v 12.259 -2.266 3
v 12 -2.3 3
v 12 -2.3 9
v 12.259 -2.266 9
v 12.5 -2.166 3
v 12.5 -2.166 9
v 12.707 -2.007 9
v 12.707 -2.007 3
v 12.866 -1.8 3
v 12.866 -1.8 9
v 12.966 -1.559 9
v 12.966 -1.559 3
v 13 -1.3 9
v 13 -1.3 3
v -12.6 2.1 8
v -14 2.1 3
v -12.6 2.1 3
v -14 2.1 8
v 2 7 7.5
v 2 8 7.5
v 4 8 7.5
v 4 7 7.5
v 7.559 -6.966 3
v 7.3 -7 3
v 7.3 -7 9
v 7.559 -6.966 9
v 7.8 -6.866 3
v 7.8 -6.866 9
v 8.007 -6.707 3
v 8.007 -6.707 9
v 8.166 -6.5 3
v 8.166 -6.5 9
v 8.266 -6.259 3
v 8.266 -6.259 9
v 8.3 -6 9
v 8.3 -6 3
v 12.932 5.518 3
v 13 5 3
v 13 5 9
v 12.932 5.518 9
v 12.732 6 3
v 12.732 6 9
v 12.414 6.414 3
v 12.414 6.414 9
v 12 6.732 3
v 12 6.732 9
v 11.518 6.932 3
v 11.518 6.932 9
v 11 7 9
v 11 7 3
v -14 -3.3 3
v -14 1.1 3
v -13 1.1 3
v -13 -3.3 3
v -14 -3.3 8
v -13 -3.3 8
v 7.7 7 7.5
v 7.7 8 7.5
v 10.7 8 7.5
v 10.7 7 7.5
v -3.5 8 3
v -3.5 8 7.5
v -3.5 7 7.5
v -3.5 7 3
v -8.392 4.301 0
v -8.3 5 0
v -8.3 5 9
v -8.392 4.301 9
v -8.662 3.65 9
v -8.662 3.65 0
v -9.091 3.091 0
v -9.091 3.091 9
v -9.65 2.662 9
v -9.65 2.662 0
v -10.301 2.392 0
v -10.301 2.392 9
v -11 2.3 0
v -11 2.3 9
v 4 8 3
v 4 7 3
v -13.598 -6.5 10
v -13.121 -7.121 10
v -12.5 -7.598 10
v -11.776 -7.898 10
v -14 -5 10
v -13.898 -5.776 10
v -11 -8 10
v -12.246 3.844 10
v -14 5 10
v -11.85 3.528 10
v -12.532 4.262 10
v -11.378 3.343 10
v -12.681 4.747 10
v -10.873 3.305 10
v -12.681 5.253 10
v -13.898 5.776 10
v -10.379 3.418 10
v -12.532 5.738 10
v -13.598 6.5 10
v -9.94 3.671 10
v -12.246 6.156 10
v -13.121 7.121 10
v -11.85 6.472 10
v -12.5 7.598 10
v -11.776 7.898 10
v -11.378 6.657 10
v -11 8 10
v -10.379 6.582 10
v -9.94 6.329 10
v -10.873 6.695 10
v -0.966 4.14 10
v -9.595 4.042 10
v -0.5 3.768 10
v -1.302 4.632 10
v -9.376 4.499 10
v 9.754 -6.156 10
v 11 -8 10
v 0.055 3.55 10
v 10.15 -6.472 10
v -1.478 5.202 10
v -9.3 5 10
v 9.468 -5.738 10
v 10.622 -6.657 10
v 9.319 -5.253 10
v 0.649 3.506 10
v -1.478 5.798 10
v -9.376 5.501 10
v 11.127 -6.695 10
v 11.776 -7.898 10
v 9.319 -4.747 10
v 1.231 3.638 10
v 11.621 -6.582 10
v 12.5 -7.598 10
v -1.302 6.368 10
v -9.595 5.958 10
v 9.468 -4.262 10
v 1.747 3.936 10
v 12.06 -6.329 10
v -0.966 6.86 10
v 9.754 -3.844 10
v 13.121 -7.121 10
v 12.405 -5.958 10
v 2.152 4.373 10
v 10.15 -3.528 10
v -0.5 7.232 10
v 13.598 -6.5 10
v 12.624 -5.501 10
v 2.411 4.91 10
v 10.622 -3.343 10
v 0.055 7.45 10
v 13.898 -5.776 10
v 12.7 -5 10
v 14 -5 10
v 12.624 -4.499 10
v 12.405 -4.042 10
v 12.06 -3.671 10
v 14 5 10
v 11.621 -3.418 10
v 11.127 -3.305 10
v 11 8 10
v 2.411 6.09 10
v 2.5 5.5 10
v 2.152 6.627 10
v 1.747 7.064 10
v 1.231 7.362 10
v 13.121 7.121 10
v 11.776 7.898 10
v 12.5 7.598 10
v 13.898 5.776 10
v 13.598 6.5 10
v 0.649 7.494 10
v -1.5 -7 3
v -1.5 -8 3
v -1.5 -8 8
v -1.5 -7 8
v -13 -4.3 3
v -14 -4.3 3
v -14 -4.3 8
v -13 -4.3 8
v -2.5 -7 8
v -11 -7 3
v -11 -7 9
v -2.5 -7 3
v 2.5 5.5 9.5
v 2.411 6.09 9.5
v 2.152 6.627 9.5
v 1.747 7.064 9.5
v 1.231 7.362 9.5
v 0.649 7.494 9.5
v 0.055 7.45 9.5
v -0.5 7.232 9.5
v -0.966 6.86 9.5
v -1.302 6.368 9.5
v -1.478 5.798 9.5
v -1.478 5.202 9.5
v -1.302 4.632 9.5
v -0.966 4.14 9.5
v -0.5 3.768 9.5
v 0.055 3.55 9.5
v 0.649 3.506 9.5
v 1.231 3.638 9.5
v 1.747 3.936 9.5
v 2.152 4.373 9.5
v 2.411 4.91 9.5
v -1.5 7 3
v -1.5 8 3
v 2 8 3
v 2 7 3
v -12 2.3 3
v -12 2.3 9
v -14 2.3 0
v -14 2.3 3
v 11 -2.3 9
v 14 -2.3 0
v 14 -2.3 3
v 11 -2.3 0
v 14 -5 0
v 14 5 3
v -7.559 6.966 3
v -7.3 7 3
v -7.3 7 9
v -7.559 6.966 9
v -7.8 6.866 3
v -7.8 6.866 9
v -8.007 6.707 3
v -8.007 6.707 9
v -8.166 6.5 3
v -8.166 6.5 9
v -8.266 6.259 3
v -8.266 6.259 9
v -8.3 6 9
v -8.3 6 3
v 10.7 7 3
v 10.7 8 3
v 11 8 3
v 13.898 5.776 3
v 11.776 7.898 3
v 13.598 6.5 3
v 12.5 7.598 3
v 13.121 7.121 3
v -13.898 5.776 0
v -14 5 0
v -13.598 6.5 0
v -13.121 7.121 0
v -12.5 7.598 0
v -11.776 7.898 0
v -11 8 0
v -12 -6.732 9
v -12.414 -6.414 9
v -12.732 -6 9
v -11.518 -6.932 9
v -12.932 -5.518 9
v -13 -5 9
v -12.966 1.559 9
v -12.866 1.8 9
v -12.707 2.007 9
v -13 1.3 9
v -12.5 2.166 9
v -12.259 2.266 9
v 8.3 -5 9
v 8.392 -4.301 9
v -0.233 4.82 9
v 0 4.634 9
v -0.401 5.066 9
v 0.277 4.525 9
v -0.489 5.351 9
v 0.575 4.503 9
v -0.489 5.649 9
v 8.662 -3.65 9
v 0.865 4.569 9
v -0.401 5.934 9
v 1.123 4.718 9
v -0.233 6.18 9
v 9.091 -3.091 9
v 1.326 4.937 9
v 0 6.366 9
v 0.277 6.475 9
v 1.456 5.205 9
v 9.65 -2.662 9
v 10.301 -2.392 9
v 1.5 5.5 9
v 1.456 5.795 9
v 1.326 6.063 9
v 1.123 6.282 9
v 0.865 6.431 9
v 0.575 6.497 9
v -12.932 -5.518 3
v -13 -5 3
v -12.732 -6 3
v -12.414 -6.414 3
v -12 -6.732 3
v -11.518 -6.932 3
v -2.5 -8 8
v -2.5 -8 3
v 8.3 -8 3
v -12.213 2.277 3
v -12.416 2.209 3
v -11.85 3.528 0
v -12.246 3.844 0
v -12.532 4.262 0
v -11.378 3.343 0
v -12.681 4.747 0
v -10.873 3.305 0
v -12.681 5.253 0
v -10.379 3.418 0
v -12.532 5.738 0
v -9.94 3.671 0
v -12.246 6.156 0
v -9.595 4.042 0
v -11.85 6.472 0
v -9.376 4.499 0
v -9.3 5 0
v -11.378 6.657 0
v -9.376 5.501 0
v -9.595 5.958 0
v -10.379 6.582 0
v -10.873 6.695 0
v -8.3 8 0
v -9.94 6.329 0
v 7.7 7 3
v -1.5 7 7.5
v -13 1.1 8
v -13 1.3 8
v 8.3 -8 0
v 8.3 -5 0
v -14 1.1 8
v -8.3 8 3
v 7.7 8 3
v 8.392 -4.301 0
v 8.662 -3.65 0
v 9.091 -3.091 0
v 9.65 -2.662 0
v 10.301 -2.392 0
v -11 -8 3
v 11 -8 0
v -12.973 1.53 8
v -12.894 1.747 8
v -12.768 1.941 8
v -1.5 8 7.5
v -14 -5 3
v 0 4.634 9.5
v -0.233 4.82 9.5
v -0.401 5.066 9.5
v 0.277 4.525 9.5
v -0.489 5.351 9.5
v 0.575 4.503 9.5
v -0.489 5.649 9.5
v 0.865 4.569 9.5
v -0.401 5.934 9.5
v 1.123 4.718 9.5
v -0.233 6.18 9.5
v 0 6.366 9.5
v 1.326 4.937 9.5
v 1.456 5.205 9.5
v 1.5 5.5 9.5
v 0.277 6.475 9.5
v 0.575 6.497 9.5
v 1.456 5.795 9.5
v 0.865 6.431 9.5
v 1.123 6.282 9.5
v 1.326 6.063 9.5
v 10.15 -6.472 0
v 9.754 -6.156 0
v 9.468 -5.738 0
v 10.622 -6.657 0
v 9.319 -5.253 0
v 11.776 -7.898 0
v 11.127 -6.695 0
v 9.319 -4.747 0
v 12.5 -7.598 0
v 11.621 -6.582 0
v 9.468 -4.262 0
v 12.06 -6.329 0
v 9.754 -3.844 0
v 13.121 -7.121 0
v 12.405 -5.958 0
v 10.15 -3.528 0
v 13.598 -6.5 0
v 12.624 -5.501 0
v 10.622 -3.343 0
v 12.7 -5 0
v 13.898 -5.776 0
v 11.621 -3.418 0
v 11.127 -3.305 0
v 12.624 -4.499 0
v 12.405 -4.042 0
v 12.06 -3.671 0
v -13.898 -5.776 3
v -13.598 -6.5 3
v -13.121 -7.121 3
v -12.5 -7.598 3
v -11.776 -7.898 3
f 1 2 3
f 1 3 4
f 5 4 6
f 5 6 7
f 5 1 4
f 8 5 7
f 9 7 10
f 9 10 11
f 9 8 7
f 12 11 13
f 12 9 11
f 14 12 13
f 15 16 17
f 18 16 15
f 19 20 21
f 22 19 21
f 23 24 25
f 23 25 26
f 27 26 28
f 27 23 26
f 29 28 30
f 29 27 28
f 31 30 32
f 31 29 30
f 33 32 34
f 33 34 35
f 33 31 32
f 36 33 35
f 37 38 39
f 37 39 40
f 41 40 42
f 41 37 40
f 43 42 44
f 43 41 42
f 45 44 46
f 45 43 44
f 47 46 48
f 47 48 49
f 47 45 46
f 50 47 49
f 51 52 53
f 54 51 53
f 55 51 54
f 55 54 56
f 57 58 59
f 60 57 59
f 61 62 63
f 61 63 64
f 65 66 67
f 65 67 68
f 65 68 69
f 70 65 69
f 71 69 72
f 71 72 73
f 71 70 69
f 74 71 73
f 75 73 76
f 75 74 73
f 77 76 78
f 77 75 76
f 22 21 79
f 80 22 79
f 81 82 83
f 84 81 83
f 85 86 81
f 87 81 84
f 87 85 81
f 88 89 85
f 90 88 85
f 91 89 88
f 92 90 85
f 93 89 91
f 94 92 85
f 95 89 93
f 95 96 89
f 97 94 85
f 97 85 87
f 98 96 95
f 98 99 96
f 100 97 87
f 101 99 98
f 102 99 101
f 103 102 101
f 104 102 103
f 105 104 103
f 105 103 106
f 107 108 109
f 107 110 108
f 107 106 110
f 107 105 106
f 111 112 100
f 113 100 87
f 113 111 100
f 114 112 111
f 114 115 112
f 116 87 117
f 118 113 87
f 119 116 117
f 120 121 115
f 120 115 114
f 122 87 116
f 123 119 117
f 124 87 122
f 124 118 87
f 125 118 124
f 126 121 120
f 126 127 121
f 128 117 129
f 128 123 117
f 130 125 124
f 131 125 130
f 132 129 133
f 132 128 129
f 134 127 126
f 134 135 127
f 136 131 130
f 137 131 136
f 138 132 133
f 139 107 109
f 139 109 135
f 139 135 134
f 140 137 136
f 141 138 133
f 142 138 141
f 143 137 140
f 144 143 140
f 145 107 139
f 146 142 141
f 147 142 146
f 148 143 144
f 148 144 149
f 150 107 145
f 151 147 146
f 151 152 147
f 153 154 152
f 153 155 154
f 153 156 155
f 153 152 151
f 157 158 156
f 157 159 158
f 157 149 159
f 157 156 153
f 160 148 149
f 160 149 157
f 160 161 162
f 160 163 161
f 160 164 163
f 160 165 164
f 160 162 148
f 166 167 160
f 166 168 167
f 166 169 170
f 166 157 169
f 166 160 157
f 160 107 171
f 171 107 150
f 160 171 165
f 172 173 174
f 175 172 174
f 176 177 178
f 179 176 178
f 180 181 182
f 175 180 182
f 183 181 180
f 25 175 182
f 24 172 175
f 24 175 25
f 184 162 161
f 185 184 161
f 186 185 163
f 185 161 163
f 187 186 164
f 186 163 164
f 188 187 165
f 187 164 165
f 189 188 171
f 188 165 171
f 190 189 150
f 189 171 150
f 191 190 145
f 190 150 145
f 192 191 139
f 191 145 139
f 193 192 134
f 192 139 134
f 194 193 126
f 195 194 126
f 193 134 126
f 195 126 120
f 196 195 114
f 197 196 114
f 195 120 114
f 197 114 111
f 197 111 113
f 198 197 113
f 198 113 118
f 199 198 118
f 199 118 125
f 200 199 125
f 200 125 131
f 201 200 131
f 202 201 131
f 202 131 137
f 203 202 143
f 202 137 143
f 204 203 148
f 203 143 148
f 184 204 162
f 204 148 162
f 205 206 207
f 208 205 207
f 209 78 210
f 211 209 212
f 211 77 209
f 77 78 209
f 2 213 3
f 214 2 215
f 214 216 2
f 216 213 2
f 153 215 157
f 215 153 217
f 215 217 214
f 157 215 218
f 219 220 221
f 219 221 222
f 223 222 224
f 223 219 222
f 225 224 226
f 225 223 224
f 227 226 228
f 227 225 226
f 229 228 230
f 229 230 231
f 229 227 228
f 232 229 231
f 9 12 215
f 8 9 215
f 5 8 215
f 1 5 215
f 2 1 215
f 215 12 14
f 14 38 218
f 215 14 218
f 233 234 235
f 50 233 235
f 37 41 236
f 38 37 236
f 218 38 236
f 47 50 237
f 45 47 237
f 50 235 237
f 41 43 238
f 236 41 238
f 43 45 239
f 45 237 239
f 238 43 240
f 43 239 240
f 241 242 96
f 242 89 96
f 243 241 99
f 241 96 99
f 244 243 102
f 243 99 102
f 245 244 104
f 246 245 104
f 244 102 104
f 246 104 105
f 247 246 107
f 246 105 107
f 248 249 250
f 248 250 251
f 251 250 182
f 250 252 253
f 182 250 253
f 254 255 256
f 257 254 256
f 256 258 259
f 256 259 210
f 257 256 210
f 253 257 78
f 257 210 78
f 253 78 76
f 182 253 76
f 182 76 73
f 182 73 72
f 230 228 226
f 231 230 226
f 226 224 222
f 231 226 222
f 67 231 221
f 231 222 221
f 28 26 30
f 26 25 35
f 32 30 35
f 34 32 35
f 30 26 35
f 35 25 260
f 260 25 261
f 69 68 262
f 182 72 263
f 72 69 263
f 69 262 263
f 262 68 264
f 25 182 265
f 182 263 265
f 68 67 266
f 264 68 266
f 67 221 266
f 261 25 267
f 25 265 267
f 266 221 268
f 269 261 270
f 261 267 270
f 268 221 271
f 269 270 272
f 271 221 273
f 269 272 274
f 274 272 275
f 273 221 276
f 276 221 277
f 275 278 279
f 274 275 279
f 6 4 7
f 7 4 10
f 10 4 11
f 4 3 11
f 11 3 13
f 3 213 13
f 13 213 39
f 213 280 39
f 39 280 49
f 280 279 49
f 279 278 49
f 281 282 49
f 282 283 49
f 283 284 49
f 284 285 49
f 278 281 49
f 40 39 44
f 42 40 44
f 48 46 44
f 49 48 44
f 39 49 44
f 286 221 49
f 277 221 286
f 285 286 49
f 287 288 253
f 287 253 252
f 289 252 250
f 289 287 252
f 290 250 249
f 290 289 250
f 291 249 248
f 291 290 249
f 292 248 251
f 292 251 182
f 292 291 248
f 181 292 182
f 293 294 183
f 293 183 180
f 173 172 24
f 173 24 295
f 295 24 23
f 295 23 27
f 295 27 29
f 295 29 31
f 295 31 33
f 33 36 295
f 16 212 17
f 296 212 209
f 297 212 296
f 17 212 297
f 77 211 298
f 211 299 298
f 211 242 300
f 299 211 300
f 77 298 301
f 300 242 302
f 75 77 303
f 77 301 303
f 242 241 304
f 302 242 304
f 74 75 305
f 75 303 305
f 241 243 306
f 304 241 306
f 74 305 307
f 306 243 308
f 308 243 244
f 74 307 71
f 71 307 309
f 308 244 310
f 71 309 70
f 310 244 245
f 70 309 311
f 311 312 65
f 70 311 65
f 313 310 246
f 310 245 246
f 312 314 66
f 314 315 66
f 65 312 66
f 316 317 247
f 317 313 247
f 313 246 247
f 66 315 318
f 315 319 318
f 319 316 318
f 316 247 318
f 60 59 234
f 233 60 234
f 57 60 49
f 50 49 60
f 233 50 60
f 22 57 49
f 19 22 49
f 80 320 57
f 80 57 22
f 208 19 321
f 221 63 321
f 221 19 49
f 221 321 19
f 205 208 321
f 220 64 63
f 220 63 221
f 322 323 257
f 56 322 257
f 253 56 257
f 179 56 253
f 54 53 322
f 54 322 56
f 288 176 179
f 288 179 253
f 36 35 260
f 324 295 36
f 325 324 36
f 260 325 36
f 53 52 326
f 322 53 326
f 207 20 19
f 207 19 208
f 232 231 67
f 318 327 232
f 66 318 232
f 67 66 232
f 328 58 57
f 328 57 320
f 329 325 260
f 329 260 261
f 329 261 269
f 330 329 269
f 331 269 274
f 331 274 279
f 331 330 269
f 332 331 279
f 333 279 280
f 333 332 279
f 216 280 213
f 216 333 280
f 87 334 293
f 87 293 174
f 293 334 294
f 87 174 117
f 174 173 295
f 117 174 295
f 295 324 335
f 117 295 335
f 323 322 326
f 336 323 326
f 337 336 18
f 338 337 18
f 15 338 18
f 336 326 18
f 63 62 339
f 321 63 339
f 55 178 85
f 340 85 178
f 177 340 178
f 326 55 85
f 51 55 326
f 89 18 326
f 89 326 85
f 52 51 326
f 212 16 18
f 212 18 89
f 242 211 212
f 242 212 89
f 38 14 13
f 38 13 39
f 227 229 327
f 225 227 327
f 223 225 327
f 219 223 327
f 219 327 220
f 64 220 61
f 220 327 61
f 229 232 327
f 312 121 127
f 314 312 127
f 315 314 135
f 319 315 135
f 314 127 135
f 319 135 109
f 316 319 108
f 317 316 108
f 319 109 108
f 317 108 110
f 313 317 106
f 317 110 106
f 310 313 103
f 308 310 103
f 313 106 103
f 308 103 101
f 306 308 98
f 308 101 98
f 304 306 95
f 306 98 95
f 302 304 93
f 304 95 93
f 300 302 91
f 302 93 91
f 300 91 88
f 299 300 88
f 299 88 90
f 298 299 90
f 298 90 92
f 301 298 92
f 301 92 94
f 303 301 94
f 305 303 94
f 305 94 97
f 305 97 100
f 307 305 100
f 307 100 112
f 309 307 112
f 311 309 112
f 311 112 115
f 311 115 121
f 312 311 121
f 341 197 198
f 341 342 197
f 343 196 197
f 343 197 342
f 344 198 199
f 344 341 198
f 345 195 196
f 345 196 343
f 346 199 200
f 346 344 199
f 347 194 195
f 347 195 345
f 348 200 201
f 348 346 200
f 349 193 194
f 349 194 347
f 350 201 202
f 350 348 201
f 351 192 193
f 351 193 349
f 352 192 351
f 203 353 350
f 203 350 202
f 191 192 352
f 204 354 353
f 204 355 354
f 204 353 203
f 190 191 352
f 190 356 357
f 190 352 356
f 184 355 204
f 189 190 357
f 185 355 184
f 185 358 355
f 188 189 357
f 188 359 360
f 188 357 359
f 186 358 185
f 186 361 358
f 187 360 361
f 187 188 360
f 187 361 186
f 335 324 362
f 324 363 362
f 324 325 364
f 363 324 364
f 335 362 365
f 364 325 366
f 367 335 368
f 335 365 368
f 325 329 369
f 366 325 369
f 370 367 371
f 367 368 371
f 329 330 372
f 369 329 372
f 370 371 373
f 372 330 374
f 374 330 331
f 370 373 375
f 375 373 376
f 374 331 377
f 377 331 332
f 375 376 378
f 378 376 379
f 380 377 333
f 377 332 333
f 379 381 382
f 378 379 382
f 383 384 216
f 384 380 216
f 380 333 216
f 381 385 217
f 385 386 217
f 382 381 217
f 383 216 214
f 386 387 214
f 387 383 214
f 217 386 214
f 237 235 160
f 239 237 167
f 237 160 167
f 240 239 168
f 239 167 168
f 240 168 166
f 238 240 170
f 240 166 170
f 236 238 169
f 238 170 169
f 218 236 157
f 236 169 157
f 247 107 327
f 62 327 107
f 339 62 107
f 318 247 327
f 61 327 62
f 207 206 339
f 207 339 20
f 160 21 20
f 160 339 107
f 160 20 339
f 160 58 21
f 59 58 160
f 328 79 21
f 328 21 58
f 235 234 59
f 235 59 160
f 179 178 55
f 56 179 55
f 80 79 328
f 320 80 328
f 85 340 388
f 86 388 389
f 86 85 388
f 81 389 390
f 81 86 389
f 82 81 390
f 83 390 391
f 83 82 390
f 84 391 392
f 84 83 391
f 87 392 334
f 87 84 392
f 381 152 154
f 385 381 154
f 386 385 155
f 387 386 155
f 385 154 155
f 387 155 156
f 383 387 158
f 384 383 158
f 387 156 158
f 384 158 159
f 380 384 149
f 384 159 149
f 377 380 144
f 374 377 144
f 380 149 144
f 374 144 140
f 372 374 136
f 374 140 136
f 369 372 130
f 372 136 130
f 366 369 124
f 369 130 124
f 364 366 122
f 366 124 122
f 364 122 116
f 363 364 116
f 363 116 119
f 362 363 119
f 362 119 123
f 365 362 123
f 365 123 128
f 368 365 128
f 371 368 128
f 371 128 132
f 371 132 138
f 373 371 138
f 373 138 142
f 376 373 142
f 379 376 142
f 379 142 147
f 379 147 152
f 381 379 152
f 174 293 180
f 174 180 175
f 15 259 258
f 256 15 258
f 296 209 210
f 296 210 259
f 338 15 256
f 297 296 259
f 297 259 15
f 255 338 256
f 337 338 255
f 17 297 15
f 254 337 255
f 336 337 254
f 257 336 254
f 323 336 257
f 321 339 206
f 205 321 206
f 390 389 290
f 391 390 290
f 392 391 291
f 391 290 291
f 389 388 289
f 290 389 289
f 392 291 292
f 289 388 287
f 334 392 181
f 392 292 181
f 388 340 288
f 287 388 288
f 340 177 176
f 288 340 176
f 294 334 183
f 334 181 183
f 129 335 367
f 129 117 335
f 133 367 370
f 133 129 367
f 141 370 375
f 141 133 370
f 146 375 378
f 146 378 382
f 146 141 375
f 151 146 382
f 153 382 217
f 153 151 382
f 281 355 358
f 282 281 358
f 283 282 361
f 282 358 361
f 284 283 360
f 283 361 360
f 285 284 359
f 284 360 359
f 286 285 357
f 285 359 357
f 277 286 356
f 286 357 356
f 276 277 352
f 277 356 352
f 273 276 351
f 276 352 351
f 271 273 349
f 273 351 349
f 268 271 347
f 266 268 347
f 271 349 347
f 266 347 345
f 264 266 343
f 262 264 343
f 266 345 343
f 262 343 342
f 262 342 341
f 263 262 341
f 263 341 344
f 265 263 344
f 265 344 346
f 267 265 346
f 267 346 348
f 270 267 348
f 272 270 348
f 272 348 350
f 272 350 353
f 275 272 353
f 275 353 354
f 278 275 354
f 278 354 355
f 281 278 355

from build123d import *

# Parameters (mm, degrees)
SZKIC1_W                        = 28
SZKIC1_H                        = 16
DODANIE_WYCI_GNI_CIE1_DEPTH     = 10
WYTNIJ_WYCI_GNI_CIE1_REACH      = 12
SZKIC2_R                        = 1.7
ZAOKR_GLENIE1_R                 = 3
WYTNIJ_WYCI_GNI_CIE2_DEPTH      = 4
WYTNIJ_WYCI_GNI_CIE2_DEPTH_BACK = 4
WYTNIJ_WYCI_GNI_CIE3_DEPTH      = 3
WYTNIJ_WYCI_GNI_CIE4_REACH      = 18
SZKIC5_W                        = 2
SZKIC5_H                        = 4.5
SZKIC5_W_2                      = 3
SZKIC6_R                        = 2
WYTNIJ_WYCI_GNI_CIE5_DEPTH      = 0.5
WYTNIJ_WYCI_GNI_CIE6_REACH      = 11.5
SZKIC7_R                        = 1
WYTNIJ_WYCI_GNI_CIE7_REACH      = 30
SZKIC8_W                        = 5
SZKIC8_H                        = 1
WYTNIJ_WYCI_GNI_CIE8_REACH      = 18
SZKIC9_W                        = 1
SZKIC9_H                        = 5


with BuildPart() as part:
    # Szkic1 → Dodanie-wyciągnięcie1 (new body)
    with BuildSketch(Plane.XY):
        Rectangle(SZKIC1_W, SZKIC1_H)
    extrude(amount=DODANIE_WYCI_GNI_CIE1_DEPTH)

    # Szkic2 → Wytnij-wyciągnięcie1 (cut, up to next)
    with BuildSketch(Plane.XY.offset(10), mode=Mode.PRIVATE) as wytnij_wyci_gni_cie1_sk1:
        with Locations((-11, 5)):
            Circle(SZKIC2_R)
    wytnij_wyci_gni_cie1_tool1 = extrude(wytnij_wyci_gni_cie1_sk1.sketch, amount=-WYTNIJ_WYCI_GNI_CIE1_REACH, mode=Mode.PRIVATE) & part.part
    add(wytnij_wyci_gni_cie1_tool1.solids().sort_by_distance((-11, 5, 10))[0], mode=Mode.SUBTRACT)
    # Szkic2 → Wytnij-wyciągnięcie1 (cut, up to next)
    with BuildSketch(Plane.XY.offset(10), mode=Mode.PRIVATE) as wytnij_wyci_gni_cie1_sk2:
        with Locations((11, -5)):
            Circle(SZKIC2_R)
    wytnij_wyci_gni_cie1_tool2 = extrude(wytnij_wyci_gni_cie1_sk2.sketch, amount=-WYTNIJ_WYCI_GNI_CIE1_REACH, mode=Mode.PRIVATE) & part.part
    add(wytnij_wyci_gni_cie1_tool2.solids().sort_by_distance((11, -5, 10))[0], mode=Mode.SUBTRACT)

    # Zaokrąglenie1
    zaokr_glenie1_edges = [part.edges().sort_by_distance(p)[0] for p in [
        (14, -8, 5),
        (-14, -8, 5),
        (-14, 8, 5),
        (14, 8, 5),
    ]]
    fillet(zaokr_glenie1_edges, radius=ZAOKR_GLENIE1_R)

    # Szkic3 → Wytnij-wyciągnięcie2 (cut, two sides)
    with BuildSketch(Plane.XY.offset(5)) as wytnij_wyci_gni_cie2_sk:
        with BuildLine():
            Line((11, 7), (-7.3, 7))
            ThreePointArc((-7.3, 7), (-8.007106781, 6.707106781), (-8.3, 6))
            Line((-8.3, 6), (-8.3, 5))
            ThreePointArc((-8.3, 5), (-9.090811691, 3.090811691), (-11, 2.3))
            Line((-11, 2.3), (-12, 2.3))
            ThreePointArc((-12, 2.3), (-12.707106781, 2.007106781), (-13, 1.3))
            Line((-13, 1.3), (-13, -5))
            ThreePointArc((-13, -5), (-12.414213562, -6.414213562), (-11, -7))
            Line((-11, -7), (7.3, -7))
            ThreePointArc((7.3, -7), (8.007106781, -6.707106781), (8.3, -6))
            Line((8.3, -6), (8.3, -5))
            ThreePointArc((8.3, -5), (9.090811691, -3.090811691), (11, -2.3))
            Line((11, -2.3), (12, -2.3))
            ThreePointArc((12, -2.3), (12.707106781, -2.007106781), (13, -1.3))
            Line((13, -1.3), (13, 5))
            ThreePointArc((13, 5), (12.414213562, 6.414213562), (11, 7))
        make_face()
    extrude(amount=WYTNIJ_WYCI_GNI_CIE2_DEPTH, mode=Mode.SUBTRACT)
    extrude(wytnij_wyci_gni_cie2_sk.sketch, amount=-WYTNIJ_WYCI_GNI_CIE2_DEPTH_BACK, mode=Mode.SUBTRACT)

    # Szkic4 → Wytnij-wyciągnięcie3 (cut)
    with BuildSketch(Plane(origin=(0, 0, 0), x_dir=(-1, 0, 0), z_dir=(0, 0, -1))):
        with BuildLine():
            Line((-11, 8), (8.3, 8))
            Line((8.3, 8), (8.3, 5))
            ThreePointArc((8.3, 5), (9.090811691, 3.090811691), (11, 2.3))
            Line((11, 2.3), (14, 2.3))
            Line((14, 2.3), (14, -5))
            ThreePointArc((14, -5), (13.121320344, -7.121320344), (11, -8))
            Line((11, -8), (-8.3, -8))
            Line((-8.3, -8), (-8.3, -5))
            ThreePointArc((-8.3, -5), (-9.090811691, -3.090811691), (-11, -2.3))
            Line((-11, -2.3), (-14, -2.3))
            Line((-14, -2.3), (-14, 5))
            ThreePointArc((-14, 5), (-13.121320344, 7.121320344), (-11, 8))
        make_face()
    extrude(amount=-WYTNIJ_WYCI_GNI_CIE3_DEPTH, mode=Mode.SUBTRACT)

    # Szkic5 → Wytnij-wyciągnięcie4 (cut, up to next)
    with BuildSketch(Plane(origin=(0, 8, 0), x_dir=(1, 0, 0), z_dir=(0, 1, 0)), mode=Mode.PRIVATE) as wytnij_wyci_gni_cie4_sk1:
        with Locations((3, -5.25)):
            Rectangle(SZKIC5_W, SZKIC5_H)
    wytnij_wyci_gni_cie4_tool1 = extrude(wytnij_wyci_gni_cie4_sk1.sketch, amount=-WYTNIJ_WYCI_GNI_CIE4_REACH, mode=Mode.PRIVATE) & part.part
    add(wytnij_wyci_gni_cie4_tool1.solids().sort_by_distance((3, 8, 5.25))[0], mode=Mode.SUBTRACT)
    # Szkic5 → Wytnij-wyciągnięcie4 (cut, up to next)
    with BuildSketch(Plane(origin=(0, 8, 0), x_dir=(1, 0, 0), z_dir=(0, 1, 0)), mode=Mode.PRIVATE) as wytnij_wyci_gni_cie4_sk2:
        with Locations((9.2, -5.25)):
            Rectangle(SZKIC5_W_2, SZKIC5_H)
    wytnij_wyci_gni_cie4_tool2 = extrude(wytnij_wyci_gni_cie4_sk2.sketch, amount=-WYTNIJ_WYCI_GNI_CIE4_REACH, mode=Mode.PRIVATE) & part.part
    add(wytnij_wyci_gni_cie4_tool2.solids().sort_by_distance((9.2, 8, 5.25))[0], mode=Mode.SUBTRACT)
    # Szkic5 → Wytnij-wyciągnięcie4 (cut, up to next)
    with BuildSketch(Plane(origin=(0, 8, 0), x_dir=(1, 0, 0), z_dir=(0, 1, 0)), mode=Mode.PRIVATE) as wytnij_wyci_gni_cie4_sk3:
        with Locations((-2.5, -5.25)):
            Rectangle(SZKIC5_W, SZKIC5_H)
    wytnij_wyci_gni_cie4_tool3 = extrude(wytnij_wyci_gni_cie4_sk3.sketch, amount=-WYTNIJ_WYCI_GNI_CIE4_REACH, mode=Mode.PRIVATE) & part.part
    add(wytnij_wyci_gni_cie4_tool3.solids().sort_by_distance((-2.5, 8, 5.25))[0], mode=Mode.SUBTRACT)

    # Szkic6 → Wytnij-wyciągnięcie5 (cut)
    with BuildSketch(Plane.XY.offset(10)):
        with Locations((0.5, 5.5)):
            Circle(SZKIC6_R)
    extrude(amount=-WYTNIJ_WYCI_GNI_CIE5_DEPTH, mode=Mode.SUBTRACT)

    # Szkic7 → Wytnij-wyciągnięcie6 (cut, up to next)
    with BuildSketch(Plane.XY.offset(9.5), mode=Mode.PRIVATE) as wytnij_wyci_gni_cie6_sk1:
        with Locations((0.5, 5.5)):
            Circle(SZKIC7_R)
    wytnij_wyci_gni_cie6_tool1 = extrude(wytnij_wyci_gni_cie6_sk1.sketch, amount=-WYTNIJ_WYCI_GNI_CIE6_REACH, mode=Mode.PRIVATE) & part.part
    add(wytnij_wyci_gni_cie6_tool1.solids().sort_by_distance((0.5, 5.5, 9.5))[0], mode=Mode.SUBTRACT)

    # Szkic8 → Wytnij-wyciągnięcie7 (cut, up to next)
    with BuildSketch(Plane.ZY.offset(14), mode=Mode.PRIVATE) as wytnij_wyci_gni_cie7_sk1:
        with Locations((5.5, 1.6)):
            Rectangle(SZKIC8_W, SZKIC8_H)
    wytnij_wyci_gni_cie7_tool1 = extrude(wytnij_wyci_gni_cie7_sk1.sketch, amount=-WYTNIJ_WYCI_GNI_CIE7_REACH, mode=Mode.PRIVATE) & part.part
    add(wytnij_wyci_gni_cie7_tool1.solids().sort_by_distance((-14, 1.6, 5.5))[0], mode=Mode.SUBTRACT)
    # Szkic8 → Wytnij-wyciągnięcie7 (cut, up to next)
    with BuildSketch(Plane.ZY.offset(14), mode=Mode.PRIVATE) as wytnij_wyci_gni_cie7_sk2:
        with Locations((5.5, -3.8)):
            Rectangle(SZKIC8_W, SZKIC8_H)
    wytnij_wyci_gni_cie7_tool2 = extrude(wytnij_wyci_gni_cie7_sk2.sketch, amount=-WYTNIJ_WYCI_GNI_CIE7_REACH, mode=Mode.PRIVATE) & part.part
    add(wytnij_wyci_gni_cie7_tool2.solids().sort_by_distance((-14, -3.8, 5.5))[0], mode=Mode.SUBTRACT)

    # Szkic9 → Wytnij-wyciągnięcie8 (cut, up to next)
    with BuildSketch(Plane.XZ.offset(8), mode=Mode.PRIVATE) as wytnij_wyci_gni_cie8_sk1:
        with Locations((-2, 5.5)):
            Rectangle(SZKIC9_W, SZKIC9_H)
    wytnij_wyci_gni_cie8_tool1 = extrude(wytnij_wyci_gni_cie8_sk1.sketch, amount=-WYTNIJ_WYCI_GNI_CIE8_REACH, mode=Mode.PRIVATE) & part.part
    add(wytnij_wyci_gni_cie8_tool1.solids().sort_by_distance((-2, -8, 5.5))[0], mode=Mode.SUBTRACT)


solid = part.part
